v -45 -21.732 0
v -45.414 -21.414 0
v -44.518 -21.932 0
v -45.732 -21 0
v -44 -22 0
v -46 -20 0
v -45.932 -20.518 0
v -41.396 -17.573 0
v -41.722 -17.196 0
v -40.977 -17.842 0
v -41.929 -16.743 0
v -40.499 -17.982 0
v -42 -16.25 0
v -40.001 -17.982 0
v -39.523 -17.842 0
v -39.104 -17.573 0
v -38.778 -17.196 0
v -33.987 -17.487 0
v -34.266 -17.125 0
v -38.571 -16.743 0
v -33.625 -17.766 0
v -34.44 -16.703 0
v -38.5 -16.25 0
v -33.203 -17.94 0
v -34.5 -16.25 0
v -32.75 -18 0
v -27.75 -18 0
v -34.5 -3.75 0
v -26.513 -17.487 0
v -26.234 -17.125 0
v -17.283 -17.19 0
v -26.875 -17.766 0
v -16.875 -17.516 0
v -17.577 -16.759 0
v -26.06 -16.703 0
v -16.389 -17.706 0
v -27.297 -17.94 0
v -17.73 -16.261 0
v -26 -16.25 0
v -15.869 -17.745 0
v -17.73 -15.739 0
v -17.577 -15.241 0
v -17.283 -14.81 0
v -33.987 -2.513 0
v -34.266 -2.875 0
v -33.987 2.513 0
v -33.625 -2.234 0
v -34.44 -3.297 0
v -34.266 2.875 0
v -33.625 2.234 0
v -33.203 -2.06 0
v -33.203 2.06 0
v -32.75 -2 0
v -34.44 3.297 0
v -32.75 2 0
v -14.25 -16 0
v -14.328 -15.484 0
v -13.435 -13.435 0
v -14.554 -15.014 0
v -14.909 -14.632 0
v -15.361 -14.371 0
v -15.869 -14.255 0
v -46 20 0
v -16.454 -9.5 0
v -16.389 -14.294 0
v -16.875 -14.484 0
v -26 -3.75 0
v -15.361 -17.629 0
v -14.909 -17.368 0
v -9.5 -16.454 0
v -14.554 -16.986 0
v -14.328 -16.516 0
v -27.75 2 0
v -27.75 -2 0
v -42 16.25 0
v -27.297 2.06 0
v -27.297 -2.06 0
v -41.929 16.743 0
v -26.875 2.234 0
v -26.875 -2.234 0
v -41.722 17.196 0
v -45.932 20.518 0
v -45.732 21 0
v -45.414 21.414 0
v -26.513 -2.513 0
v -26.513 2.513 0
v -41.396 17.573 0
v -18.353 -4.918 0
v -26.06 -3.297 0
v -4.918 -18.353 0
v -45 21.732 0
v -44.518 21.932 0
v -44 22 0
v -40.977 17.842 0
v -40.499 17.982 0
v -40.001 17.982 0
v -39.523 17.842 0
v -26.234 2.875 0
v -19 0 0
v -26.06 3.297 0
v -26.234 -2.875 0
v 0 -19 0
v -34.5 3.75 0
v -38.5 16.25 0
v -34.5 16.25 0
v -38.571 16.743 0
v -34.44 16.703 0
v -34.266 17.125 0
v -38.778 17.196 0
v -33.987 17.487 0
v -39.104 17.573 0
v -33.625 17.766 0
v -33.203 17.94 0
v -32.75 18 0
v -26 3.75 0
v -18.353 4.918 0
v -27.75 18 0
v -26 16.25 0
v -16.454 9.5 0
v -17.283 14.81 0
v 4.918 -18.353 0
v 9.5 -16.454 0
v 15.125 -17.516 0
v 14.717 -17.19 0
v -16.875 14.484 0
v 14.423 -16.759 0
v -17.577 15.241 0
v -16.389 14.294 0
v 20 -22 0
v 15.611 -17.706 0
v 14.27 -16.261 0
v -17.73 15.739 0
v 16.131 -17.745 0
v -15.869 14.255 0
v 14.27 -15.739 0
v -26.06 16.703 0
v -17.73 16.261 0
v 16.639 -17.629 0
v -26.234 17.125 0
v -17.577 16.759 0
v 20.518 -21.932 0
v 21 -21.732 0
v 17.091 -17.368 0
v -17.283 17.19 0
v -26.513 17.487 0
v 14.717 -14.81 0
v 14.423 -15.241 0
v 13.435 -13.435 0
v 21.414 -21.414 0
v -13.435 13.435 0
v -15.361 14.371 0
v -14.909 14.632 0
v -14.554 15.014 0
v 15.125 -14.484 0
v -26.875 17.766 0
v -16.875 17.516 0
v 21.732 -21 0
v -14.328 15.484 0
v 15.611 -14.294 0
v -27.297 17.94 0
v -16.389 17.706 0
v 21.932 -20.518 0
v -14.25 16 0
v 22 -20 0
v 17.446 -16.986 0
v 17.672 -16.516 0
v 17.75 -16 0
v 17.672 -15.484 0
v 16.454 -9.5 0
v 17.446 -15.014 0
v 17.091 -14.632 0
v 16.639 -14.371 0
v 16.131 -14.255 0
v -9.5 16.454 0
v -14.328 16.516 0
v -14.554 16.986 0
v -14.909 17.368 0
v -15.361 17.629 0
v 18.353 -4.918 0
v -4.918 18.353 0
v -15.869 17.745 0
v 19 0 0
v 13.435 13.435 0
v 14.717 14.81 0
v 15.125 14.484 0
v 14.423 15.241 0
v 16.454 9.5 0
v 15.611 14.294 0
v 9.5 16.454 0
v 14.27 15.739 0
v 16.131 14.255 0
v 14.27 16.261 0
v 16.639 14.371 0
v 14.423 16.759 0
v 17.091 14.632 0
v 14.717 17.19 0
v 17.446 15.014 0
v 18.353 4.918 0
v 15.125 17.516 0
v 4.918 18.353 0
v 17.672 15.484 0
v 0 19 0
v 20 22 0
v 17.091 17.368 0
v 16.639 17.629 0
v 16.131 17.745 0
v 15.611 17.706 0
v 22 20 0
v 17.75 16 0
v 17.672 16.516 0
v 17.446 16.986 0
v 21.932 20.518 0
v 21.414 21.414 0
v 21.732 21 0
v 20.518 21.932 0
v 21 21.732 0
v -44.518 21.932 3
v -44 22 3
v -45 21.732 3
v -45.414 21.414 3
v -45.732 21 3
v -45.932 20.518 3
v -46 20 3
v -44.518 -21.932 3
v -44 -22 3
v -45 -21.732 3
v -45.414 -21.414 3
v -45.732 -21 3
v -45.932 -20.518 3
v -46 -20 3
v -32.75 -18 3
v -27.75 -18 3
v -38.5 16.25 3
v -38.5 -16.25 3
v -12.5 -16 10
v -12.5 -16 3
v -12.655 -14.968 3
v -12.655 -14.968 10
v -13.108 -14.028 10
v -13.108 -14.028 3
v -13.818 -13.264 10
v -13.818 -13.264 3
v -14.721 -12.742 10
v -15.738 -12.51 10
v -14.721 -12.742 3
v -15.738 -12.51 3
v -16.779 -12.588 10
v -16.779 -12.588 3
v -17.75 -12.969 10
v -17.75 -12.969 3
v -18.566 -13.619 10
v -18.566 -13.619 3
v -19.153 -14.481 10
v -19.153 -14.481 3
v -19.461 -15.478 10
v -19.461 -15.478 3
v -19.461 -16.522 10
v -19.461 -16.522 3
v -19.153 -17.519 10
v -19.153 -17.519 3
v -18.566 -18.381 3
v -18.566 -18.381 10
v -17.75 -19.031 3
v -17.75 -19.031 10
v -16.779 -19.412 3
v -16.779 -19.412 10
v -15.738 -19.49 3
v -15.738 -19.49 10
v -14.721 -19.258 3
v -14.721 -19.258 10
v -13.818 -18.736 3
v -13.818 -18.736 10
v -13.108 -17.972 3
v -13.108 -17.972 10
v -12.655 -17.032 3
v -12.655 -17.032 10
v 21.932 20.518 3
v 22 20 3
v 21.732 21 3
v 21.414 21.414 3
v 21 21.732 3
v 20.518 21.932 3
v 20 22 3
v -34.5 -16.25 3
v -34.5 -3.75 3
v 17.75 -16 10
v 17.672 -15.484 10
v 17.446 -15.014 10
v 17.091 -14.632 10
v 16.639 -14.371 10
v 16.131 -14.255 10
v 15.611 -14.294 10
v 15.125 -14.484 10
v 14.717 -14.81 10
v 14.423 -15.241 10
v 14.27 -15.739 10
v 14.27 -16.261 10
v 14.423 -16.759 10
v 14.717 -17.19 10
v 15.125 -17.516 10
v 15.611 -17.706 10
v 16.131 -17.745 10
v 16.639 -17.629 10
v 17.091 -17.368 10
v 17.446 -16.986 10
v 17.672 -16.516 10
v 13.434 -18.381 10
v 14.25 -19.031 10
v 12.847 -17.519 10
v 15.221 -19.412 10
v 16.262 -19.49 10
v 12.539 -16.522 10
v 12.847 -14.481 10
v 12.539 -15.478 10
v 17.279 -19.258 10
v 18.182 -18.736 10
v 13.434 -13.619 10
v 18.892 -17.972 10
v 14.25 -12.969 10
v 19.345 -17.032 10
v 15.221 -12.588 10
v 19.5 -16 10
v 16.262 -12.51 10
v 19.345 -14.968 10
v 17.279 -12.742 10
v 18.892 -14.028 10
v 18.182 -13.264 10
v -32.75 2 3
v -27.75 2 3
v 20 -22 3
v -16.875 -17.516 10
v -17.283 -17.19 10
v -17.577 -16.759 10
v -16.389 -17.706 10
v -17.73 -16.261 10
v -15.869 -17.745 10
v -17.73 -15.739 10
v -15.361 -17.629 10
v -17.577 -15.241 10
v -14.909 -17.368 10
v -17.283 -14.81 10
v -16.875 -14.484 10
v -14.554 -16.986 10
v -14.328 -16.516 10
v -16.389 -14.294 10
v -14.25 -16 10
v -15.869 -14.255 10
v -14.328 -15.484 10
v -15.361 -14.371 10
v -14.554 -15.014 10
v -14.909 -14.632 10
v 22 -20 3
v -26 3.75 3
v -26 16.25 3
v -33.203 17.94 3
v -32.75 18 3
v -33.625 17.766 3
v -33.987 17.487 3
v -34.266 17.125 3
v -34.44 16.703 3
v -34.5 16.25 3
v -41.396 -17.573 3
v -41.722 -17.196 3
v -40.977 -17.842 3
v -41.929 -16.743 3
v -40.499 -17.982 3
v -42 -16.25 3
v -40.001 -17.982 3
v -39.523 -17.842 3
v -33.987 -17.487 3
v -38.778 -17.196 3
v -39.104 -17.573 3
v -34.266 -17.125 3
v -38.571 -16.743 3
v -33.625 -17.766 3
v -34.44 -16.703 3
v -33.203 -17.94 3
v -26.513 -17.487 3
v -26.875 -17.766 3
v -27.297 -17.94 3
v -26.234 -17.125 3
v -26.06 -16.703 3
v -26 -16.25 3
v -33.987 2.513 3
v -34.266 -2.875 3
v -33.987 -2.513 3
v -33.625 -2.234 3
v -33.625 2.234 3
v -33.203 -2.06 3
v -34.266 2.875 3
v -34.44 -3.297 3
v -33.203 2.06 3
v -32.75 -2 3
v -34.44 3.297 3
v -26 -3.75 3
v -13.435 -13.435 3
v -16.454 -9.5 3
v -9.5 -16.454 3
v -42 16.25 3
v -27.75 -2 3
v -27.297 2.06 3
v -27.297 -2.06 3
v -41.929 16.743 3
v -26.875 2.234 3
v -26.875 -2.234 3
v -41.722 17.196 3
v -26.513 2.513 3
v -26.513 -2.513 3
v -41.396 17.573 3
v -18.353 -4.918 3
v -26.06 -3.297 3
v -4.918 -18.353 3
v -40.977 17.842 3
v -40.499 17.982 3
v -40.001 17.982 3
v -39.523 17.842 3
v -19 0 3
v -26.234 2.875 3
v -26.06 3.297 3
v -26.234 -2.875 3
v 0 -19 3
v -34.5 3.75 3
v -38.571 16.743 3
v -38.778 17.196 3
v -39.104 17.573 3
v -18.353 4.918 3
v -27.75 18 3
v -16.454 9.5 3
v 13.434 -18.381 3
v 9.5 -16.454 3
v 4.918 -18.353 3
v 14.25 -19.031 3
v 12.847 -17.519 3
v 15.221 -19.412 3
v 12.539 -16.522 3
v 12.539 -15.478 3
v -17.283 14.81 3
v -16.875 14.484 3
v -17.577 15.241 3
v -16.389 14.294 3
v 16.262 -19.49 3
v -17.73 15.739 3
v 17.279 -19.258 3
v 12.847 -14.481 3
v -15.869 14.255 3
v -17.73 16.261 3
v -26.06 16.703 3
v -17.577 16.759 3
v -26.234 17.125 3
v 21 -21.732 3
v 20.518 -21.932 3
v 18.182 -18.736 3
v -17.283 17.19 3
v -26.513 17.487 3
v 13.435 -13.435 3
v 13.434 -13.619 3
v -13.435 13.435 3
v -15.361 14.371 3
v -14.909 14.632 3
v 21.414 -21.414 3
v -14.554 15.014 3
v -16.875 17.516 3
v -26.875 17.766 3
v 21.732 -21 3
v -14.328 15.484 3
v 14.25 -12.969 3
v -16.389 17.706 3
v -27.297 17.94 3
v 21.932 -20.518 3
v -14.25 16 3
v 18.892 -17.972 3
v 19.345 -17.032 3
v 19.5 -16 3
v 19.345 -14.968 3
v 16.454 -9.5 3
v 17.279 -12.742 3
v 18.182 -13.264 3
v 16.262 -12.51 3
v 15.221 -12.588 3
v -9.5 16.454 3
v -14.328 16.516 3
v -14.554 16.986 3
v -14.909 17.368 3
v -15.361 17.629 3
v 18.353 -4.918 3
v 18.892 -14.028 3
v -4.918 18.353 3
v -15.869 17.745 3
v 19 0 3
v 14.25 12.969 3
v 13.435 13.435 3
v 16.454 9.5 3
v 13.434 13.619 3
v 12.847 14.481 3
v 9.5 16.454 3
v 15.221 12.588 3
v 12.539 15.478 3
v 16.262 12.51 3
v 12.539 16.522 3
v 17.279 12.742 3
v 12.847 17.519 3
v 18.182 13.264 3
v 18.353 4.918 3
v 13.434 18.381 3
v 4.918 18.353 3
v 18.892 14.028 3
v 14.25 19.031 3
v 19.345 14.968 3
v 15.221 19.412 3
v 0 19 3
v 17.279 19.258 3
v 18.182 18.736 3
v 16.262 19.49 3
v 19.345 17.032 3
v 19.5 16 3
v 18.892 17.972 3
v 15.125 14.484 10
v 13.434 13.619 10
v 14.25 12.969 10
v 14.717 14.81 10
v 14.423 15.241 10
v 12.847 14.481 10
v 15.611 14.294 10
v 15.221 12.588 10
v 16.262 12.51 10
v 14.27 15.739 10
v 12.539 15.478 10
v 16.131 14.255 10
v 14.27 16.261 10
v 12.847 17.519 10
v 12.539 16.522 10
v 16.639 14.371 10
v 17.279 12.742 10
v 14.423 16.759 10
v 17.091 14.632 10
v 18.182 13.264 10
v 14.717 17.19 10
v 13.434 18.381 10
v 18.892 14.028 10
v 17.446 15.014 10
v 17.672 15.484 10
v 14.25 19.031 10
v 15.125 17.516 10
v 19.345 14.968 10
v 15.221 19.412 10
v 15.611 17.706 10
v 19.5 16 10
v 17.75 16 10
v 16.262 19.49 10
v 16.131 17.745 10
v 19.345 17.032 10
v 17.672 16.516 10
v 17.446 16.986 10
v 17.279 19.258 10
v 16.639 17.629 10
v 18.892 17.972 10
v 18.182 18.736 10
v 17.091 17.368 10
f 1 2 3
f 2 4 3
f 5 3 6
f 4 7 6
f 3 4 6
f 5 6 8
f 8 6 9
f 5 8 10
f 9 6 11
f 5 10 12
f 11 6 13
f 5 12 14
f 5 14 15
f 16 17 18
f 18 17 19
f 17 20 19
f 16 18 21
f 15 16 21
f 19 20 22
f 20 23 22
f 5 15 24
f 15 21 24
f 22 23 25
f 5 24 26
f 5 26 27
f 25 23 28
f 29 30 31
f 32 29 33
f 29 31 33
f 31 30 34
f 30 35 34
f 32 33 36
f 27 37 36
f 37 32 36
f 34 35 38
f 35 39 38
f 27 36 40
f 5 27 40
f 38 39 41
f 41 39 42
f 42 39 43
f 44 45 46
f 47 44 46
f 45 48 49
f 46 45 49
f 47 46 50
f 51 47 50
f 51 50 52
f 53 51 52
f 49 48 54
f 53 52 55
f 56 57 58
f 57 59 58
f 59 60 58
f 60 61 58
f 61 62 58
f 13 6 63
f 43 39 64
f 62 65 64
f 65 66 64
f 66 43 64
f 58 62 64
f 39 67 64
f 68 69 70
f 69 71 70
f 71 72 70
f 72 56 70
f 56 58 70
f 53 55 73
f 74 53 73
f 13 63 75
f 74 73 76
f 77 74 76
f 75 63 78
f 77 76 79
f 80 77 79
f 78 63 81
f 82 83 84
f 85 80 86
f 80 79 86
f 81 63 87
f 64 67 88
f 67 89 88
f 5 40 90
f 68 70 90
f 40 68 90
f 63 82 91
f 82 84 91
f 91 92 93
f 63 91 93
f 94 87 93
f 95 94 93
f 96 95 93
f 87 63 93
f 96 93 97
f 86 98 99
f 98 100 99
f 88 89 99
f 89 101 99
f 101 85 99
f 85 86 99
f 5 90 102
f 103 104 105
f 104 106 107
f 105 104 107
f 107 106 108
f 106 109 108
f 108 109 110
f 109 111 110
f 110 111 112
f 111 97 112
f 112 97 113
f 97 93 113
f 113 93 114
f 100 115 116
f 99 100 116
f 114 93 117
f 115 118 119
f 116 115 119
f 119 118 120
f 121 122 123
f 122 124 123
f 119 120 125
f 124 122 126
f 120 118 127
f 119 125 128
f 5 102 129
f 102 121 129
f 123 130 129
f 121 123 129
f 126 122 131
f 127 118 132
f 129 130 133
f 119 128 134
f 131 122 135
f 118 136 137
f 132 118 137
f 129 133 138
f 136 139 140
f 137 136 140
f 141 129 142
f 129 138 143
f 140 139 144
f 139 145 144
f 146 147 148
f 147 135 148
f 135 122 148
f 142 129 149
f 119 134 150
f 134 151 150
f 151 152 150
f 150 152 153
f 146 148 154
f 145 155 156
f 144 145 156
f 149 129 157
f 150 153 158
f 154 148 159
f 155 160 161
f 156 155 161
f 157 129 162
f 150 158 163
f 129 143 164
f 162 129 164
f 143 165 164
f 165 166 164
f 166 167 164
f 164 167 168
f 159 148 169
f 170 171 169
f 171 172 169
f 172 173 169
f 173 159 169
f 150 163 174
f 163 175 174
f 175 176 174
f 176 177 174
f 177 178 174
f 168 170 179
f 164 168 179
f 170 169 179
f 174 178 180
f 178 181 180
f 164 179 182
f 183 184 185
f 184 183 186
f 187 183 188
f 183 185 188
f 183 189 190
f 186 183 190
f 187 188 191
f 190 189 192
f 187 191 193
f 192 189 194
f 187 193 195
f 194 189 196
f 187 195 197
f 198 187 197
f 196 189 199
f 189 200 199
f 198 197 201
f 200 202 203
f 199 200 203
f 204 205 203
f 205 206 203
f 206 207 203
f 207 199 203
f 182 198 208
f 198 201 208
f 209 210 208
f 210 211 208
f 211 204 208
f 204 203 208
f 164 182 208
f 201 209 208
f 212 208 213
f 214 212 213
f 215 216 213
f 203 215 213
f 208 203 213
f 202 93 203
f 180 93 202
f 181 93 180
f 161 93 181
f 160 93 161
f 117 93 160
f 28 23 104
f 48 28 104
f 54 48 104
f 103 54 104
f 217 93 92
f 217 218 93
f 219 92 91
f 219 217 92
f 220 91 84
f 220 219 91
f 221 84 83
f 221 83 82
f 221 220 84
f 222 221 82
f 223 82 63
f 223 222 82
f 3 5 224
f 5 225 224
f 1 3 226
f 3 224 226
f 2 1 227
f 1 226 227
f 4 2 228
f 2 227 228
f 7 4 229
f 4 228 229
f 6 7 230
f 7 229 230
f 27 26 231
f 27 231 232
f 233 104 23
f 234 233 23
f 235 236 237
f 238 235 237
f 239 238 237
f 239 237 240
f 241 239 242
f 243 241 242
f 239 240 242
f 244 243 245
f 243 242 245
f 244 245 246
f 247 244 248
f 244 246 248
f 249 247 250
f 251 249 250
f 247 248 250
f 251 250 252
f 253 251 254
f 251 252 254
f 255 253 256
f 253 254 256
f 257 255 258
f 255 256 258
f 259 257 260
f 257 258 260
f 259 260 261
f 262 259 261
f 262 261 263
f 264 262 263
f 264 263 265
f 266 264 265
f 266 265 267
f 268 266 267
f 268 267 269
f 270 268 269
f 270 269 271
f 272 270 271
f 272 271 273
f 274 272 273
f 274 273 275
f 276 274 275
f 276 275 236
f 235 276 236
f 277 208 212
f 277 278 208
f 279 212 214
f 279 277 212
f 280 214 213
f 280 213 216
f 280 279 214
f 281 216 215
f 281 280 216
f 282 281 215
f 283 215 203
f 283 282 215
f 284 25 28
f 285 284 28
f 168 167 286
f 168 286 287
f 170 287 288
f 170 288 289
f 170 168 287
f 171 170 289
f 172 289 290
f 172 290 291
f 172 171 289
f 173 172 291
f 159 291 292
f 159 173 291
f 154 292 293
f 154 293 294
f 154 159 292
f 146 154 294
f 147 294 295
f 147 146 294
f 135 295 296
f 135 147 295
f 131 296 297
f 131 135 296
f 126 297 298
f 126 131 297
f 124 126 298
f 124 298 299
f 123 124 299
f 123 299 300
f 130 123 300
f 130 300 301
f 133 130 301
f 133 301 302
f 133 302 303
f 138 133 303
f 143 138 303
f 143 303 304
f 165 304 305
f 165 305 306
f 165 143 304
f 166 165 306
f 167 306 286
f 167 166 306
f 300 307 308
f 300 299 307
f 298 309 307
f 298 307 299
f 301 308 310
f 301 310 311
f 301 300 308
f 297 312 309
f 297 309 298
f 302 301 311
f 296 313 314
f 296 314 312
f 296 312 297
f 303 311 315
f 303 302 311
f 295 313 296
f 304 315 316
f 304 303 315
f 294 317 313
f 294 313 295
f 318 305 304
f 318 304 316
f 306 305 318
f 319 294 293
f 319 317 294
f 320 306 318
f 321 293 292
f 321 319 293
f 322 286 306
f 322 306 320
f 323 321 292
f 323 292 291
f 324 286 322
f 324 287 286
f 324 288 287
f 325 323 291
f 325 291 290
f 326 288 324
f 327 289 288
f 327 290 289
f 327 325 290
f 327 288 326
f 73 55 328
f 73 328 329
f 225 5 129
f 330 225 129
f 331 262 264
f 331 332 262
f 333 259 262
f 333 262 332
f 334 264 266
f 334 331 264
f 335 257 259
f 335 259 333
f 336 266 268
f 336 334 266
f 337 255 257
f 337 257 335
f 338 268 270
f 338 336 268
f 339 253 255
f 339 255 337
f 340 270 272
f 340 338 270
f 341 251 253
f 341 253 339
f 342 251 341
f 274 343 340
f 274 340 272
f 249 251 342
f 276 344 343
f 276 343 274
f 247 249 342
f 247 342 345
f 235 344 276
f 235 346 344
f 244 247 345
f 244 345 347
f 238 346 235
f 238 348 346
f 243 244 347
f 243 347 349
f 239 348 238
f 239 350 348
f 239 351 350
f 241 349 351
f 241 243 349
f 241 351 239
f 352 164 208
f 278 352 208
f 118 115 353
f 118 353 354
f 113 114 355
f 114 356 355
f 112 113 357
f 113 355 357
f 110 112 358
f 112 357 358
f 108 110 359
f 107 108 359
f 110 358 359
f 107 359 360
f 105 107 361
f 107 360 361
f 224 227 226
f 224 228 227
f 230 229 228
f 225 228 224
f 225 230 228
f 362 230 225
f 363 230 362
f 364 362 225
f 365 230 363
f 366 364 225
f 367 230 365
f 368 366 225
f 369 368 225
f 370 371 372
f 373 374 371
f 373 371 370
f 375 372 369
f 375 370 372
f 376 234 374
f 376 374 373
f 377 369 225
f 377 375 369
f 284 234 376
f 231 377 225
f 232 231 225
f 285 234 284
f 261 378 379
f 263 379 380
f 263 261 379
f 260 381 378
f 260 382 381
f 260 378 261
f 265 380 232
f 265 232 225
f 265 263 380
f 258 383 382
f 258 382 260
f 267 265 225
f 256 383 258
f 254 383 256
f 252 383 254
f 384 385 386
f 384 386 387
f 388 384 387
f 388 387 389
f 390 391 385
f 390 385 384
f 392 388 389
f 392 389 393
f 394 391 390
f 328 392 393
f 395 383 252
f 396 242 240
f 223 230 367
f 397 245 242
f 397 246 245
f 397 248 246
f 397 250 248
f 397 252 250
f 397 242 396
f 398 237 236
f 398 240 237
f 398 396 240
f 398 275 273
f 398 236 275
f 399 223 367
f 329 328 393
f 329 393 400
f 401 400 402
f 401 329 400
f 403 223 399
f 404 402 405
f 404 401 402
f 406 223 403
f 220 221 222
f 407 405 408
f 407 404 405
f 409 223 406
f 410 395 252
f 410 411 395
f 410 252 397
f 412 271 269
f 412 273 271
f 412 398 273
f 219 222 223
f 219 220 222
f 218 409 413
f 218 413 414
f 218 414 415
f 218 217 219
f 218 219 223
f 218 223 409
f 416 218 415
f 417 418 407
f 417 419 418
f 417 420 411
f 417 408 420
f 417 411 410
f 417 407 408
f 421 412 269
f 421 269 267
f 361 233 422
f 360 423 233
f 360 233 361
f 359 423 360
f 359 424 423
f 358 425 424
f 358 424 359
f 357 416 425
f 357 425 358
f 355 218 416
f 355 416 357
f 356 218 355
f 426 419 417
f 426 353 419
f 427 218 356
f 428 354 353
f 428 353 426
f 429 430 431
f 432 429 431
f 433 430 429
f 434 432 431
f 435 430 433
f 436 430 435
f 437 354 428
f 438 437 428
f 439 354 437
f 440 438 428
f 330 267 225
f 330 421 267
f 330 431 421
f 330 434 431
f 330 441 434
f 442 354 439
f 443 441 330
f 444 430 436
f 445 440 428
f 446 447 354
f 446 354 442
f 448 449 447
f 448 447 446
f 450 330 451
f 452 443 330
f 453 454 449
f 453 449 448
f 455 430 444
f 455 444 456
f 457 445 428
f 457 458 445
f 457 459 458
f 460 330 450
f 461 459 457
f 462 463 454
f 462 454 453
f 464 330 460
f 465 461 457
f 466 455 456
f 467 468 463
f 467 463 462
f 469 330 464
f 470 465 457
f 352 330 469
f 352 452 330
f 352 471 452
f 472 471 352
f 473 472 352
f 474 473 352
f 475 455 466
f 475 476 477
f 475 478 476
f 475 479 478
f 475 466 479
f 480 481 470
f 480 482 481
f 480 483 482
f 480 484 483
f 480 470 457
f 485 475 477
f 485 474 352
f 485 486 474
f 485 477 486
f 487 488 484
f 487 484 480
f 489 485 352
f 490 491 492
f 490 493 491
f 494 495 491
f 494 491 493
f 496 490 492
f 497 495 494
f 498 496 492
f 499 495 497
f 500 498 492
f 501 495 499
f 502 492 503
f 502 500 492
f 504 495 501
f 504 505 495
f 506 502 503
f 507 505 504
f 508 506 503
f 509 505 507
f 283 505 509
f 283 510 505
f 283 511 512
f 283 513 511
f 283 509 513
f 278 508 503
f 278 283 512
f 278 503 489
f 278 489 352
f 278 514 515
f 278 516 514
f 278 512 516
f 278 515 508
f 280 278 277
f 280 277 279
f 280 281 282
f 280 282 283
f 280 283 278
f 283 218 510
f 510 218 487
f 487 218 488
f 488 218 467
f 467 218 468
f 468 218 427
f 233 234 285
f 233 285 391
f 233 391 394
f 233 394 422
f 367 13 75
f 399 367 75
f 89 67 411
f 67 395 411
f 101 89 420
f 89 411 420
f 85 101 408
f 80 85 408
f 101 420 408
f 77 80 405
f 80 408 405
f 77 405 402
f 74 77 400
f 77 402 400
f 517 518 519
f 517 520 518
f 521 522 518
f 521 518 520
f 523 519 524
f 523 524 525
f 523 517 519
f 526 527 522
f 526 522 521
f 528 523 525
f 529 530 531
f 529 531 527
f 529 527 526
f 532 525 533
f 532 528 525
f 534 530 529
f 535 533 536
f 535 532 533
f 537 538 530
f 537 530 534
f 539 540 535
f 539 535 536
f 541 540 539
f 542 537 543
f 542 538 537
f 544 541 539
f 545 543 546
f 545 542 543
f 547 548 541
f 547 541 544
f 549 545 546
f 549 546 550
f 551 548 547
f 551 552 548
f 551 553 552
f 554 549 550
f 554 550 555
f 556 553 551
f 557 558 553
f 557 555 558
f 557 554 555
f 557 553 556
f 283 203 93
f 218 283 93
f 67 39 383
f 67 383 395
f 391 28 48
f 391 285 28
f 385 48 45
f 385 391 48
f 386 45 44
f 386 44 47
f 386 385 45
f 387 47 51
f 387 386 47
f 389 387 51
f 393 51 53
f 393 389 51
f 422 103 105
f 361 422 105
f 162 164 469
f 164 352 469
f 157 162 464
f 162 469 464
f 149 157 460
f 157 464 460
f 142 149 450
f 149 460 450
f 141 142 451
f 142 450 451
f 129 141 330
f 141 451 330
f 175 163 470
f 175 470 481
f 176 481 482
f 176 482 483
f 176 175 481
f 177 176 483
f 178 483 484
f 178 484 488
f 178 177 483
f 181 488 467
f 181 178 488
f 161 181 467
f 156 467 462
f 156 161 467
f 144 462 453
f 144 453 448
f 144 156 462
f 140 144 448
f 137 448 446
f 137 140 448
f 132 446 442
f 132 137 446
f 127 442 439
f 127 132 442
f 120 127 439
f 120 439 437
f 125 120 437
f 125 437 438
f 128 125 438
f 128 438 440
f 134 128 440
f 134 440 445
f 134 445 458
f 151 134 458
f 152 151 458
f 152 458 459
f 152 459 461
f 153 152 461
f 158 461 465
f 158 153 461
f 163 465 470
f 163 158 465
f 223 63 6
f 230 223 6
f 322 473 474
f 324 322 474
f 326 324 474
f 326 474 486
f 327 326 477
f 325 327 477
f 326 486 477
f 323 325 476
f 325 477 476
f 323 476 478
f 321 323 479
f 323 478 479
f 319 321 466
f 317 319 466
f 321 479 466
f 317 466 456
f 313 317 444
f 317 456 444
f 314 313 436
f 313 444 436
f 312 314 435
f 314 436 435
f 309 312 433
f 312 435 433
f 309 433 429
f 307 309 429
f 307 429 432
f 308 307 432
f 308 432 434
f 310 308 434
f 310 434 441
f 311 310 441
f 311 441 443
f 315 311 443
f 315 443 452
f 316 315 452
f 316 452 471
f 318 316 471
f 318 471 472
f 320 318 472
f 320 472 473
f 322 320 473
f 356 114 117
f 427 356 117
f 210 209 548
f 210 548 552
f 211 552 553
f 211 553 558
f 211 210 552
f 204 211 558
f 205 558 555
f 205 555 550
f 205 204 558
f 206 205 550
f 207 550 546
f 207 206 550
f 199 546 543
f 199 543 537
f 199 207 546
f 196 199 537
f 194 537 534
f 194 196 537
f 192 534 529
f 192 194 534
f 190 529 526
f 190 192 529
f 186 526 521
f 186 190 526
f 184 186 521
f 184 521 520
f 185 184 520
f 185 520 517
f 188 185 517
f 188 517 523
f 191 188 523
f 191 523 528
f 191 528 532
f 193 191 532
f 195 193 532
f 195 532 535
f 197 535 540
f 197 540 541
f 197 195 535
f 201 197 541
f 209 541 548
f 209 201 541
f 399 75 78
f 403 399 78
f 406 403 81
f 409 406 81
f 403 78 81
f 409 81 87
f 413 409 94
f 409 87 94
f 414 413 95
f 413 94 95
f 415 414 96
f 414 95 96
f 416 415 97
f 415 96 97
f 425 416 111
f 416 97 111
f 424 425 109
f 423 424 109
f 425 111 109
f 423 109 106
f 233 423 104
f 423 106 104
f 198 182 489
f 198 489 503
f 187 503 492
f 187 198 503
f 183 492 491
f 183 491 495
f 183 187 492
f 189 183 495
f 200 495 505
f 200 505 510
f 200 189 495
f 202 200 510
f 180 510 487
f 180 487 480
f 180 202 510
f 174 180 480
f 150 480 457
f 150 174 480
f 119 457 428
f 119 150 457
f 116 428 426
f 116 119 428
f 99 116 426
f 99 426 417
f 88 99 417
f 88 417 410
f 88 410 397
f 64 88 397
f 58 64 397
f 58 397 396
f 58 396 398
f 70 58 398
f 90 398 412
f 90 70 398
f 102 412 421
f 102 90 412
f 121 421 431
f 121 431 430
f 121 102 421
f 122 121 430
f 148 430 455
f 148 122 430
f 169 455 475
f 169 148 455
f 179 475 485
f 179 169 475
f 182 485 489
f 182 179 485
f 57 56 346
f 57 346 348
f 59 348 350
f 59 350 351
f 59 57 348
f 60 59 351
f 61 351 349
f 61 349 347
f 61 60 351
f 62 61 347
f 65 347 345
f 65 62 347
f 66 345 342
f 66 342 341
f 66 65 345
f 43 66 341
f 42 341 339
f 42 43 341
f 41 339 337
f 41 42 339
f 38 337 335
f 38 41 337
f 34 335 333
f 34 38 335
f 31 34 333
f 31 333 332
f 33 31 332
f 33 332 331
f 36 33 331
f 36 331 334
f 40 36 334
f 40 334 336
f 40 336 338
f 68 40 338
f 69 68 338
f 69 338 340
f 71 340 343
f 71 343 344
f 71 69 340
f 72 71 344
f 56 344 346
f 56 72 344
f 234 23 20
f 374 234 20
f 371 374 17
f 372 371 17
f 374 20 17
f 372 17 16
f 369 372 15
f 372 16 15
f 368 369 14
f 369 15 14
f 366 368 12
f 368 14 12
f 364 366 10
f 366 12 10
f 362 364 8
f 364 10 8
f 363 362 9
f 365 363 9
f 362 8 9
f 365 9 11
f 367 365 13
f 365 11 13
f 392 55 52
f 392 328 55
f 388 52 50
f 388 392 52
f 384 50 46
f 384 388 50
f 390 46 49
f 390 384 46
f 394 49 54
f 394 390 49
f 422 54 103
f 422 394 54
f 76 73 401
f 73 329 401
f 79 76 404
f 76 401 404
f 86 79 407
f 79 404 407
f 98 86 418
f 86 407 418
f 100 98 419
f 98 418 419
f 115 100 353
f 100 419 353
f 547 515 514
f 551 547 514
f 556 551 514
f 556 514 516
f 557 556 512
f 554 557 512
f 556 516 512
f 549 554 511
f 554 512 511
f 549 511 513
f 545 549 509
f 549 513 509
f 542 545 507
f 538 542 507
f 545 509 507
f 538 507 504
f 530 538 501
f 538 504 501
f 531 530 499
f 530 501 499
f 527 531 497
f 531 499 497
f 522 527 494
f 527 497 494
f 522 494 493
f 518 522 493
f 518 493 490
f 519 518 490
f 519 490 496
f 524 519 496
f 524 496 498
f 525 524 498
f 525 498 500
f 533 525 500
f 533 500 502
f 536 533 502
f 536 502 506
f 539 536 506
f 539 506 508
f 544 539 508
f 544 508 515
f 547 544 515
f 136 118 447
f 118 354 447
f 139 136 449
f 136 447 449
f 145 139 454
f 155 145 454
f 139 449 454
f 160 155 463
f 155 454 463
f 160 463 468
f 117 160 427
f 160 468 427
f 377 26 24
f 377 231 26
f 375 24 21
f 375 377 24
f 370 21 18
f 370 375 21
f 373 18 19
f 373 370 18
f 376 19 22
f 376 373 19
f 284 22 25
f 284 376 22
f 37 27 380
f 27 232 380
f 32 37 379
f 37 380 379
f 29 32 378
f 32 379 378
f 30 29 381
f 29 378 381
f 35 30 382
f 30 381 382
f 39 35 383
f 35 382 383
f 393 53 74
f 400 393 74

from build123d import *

# Parameters (mm, degrees)
F0_W     = 44
F0_H     = 44
F0_R     = 3.5
F0_R_2   = 1.75
F0_R_3   = 19
F0_W_2   = 8.5
F0_H_2   = 16
F1_DEPTH = 3
F2_DEPTH = 10
F3_R     = 1.75
F4_R     = 2


with BuildPart() as f1:
    # F0 (on Top) → F1 (new body)
    with BuildSketch(Plane.XY):
        Rectangle(F0_W, F0_H)
        with Locations((-16, -16)):
            Circle(F0_R, mode=Mode.SUBTRACT)
        with Locations((16, -16)):
            Circle(F0_R, mode=Mode.SUBTRACT)
        with Locations((-16, 16)):
            Circle(F0_R_2, mode=Mode.SUBTRACT)
        Circle(F0_R_3, mode=Mode.SUBTRACT)
        with Locations((16, 16)):
            Circle(F0_R, mode=Mode.SUBTRACT)
        Polygon((-22, -22), (-22, 22), (-42, 22), (-46, 22), (-46, -22), align=None)
        with Locations((-30.25, -10)):
            Rectangle(F0_W_2, F0_H_2, mode=Mode.SUBTRACT)
        with BuildLine():
            ThreePointArc((-42, 16.25), (-40.25, 18), (-38.5, 16.25))
            Line((-38.5, 16.25), (-38.5, -16.25))
            ThreePointArc((-38.5, -16.25), (-40.25, -18), (-42, -16.25))
            Line((-42, -16.25), (-42, 16.25))
        make_face(mode=Mode.SUBTRACT)
        with Locations((-30.25, 10)):
            Rectangle(F0_W_2, F0_H_2, mode=Mode.SUBTRACT)
    extrude(amount=F1_DEPTH)

    # F0 (on Top) → F2 (join)
    with BuildSketch(Plane.XY):
        with Locations((16, 16)):
            Circle(F0_R)
        with Locations((16, 16)):
            Circle(F0_R_2, mode=Mode.SUBTRACT)
        with Locations((16, -16)):
            Circle(F0_R)
        with Locations((16, -16)):
            Circle(F0_R_2, mode=Mode.SUBTRACT)
        with Locations((-16, -16)):
            Circle(F0_R)
        with Locations((-16, -16)):
            Circle(F0_R_2, mode=Mode.SUBTRACT)
    extrude(amount=F2_DEPTH)

    # F3
    f3_edges = [f1.edges().sort_by_distance(p)[0] for p in [
        (-34.5, 18, 1.5),
        (-26, 18, 1.5),
        (-34.5, 2, 1.5),
        (-26, 2, 1.5),
        (-34.5, -18, 1.5),
        (-26, -18, 1.5),
        (-34.5, -2, 1.5),
        (-26, -2, 1.5),
    ]]
    fillet(f3_edges, radius=F3_R)

    # F4
    f4_edges = [f1.edges().sort_by_distance(p)[0] for p in [
        (-46, 22, 1.5),
        (-46, -22, 1.5),
        (22, -22, 1.5),
        (22, 22, 1.5),
    ]]
    fillet(f4_edges, radius=F4_R)


solid = f1.part
